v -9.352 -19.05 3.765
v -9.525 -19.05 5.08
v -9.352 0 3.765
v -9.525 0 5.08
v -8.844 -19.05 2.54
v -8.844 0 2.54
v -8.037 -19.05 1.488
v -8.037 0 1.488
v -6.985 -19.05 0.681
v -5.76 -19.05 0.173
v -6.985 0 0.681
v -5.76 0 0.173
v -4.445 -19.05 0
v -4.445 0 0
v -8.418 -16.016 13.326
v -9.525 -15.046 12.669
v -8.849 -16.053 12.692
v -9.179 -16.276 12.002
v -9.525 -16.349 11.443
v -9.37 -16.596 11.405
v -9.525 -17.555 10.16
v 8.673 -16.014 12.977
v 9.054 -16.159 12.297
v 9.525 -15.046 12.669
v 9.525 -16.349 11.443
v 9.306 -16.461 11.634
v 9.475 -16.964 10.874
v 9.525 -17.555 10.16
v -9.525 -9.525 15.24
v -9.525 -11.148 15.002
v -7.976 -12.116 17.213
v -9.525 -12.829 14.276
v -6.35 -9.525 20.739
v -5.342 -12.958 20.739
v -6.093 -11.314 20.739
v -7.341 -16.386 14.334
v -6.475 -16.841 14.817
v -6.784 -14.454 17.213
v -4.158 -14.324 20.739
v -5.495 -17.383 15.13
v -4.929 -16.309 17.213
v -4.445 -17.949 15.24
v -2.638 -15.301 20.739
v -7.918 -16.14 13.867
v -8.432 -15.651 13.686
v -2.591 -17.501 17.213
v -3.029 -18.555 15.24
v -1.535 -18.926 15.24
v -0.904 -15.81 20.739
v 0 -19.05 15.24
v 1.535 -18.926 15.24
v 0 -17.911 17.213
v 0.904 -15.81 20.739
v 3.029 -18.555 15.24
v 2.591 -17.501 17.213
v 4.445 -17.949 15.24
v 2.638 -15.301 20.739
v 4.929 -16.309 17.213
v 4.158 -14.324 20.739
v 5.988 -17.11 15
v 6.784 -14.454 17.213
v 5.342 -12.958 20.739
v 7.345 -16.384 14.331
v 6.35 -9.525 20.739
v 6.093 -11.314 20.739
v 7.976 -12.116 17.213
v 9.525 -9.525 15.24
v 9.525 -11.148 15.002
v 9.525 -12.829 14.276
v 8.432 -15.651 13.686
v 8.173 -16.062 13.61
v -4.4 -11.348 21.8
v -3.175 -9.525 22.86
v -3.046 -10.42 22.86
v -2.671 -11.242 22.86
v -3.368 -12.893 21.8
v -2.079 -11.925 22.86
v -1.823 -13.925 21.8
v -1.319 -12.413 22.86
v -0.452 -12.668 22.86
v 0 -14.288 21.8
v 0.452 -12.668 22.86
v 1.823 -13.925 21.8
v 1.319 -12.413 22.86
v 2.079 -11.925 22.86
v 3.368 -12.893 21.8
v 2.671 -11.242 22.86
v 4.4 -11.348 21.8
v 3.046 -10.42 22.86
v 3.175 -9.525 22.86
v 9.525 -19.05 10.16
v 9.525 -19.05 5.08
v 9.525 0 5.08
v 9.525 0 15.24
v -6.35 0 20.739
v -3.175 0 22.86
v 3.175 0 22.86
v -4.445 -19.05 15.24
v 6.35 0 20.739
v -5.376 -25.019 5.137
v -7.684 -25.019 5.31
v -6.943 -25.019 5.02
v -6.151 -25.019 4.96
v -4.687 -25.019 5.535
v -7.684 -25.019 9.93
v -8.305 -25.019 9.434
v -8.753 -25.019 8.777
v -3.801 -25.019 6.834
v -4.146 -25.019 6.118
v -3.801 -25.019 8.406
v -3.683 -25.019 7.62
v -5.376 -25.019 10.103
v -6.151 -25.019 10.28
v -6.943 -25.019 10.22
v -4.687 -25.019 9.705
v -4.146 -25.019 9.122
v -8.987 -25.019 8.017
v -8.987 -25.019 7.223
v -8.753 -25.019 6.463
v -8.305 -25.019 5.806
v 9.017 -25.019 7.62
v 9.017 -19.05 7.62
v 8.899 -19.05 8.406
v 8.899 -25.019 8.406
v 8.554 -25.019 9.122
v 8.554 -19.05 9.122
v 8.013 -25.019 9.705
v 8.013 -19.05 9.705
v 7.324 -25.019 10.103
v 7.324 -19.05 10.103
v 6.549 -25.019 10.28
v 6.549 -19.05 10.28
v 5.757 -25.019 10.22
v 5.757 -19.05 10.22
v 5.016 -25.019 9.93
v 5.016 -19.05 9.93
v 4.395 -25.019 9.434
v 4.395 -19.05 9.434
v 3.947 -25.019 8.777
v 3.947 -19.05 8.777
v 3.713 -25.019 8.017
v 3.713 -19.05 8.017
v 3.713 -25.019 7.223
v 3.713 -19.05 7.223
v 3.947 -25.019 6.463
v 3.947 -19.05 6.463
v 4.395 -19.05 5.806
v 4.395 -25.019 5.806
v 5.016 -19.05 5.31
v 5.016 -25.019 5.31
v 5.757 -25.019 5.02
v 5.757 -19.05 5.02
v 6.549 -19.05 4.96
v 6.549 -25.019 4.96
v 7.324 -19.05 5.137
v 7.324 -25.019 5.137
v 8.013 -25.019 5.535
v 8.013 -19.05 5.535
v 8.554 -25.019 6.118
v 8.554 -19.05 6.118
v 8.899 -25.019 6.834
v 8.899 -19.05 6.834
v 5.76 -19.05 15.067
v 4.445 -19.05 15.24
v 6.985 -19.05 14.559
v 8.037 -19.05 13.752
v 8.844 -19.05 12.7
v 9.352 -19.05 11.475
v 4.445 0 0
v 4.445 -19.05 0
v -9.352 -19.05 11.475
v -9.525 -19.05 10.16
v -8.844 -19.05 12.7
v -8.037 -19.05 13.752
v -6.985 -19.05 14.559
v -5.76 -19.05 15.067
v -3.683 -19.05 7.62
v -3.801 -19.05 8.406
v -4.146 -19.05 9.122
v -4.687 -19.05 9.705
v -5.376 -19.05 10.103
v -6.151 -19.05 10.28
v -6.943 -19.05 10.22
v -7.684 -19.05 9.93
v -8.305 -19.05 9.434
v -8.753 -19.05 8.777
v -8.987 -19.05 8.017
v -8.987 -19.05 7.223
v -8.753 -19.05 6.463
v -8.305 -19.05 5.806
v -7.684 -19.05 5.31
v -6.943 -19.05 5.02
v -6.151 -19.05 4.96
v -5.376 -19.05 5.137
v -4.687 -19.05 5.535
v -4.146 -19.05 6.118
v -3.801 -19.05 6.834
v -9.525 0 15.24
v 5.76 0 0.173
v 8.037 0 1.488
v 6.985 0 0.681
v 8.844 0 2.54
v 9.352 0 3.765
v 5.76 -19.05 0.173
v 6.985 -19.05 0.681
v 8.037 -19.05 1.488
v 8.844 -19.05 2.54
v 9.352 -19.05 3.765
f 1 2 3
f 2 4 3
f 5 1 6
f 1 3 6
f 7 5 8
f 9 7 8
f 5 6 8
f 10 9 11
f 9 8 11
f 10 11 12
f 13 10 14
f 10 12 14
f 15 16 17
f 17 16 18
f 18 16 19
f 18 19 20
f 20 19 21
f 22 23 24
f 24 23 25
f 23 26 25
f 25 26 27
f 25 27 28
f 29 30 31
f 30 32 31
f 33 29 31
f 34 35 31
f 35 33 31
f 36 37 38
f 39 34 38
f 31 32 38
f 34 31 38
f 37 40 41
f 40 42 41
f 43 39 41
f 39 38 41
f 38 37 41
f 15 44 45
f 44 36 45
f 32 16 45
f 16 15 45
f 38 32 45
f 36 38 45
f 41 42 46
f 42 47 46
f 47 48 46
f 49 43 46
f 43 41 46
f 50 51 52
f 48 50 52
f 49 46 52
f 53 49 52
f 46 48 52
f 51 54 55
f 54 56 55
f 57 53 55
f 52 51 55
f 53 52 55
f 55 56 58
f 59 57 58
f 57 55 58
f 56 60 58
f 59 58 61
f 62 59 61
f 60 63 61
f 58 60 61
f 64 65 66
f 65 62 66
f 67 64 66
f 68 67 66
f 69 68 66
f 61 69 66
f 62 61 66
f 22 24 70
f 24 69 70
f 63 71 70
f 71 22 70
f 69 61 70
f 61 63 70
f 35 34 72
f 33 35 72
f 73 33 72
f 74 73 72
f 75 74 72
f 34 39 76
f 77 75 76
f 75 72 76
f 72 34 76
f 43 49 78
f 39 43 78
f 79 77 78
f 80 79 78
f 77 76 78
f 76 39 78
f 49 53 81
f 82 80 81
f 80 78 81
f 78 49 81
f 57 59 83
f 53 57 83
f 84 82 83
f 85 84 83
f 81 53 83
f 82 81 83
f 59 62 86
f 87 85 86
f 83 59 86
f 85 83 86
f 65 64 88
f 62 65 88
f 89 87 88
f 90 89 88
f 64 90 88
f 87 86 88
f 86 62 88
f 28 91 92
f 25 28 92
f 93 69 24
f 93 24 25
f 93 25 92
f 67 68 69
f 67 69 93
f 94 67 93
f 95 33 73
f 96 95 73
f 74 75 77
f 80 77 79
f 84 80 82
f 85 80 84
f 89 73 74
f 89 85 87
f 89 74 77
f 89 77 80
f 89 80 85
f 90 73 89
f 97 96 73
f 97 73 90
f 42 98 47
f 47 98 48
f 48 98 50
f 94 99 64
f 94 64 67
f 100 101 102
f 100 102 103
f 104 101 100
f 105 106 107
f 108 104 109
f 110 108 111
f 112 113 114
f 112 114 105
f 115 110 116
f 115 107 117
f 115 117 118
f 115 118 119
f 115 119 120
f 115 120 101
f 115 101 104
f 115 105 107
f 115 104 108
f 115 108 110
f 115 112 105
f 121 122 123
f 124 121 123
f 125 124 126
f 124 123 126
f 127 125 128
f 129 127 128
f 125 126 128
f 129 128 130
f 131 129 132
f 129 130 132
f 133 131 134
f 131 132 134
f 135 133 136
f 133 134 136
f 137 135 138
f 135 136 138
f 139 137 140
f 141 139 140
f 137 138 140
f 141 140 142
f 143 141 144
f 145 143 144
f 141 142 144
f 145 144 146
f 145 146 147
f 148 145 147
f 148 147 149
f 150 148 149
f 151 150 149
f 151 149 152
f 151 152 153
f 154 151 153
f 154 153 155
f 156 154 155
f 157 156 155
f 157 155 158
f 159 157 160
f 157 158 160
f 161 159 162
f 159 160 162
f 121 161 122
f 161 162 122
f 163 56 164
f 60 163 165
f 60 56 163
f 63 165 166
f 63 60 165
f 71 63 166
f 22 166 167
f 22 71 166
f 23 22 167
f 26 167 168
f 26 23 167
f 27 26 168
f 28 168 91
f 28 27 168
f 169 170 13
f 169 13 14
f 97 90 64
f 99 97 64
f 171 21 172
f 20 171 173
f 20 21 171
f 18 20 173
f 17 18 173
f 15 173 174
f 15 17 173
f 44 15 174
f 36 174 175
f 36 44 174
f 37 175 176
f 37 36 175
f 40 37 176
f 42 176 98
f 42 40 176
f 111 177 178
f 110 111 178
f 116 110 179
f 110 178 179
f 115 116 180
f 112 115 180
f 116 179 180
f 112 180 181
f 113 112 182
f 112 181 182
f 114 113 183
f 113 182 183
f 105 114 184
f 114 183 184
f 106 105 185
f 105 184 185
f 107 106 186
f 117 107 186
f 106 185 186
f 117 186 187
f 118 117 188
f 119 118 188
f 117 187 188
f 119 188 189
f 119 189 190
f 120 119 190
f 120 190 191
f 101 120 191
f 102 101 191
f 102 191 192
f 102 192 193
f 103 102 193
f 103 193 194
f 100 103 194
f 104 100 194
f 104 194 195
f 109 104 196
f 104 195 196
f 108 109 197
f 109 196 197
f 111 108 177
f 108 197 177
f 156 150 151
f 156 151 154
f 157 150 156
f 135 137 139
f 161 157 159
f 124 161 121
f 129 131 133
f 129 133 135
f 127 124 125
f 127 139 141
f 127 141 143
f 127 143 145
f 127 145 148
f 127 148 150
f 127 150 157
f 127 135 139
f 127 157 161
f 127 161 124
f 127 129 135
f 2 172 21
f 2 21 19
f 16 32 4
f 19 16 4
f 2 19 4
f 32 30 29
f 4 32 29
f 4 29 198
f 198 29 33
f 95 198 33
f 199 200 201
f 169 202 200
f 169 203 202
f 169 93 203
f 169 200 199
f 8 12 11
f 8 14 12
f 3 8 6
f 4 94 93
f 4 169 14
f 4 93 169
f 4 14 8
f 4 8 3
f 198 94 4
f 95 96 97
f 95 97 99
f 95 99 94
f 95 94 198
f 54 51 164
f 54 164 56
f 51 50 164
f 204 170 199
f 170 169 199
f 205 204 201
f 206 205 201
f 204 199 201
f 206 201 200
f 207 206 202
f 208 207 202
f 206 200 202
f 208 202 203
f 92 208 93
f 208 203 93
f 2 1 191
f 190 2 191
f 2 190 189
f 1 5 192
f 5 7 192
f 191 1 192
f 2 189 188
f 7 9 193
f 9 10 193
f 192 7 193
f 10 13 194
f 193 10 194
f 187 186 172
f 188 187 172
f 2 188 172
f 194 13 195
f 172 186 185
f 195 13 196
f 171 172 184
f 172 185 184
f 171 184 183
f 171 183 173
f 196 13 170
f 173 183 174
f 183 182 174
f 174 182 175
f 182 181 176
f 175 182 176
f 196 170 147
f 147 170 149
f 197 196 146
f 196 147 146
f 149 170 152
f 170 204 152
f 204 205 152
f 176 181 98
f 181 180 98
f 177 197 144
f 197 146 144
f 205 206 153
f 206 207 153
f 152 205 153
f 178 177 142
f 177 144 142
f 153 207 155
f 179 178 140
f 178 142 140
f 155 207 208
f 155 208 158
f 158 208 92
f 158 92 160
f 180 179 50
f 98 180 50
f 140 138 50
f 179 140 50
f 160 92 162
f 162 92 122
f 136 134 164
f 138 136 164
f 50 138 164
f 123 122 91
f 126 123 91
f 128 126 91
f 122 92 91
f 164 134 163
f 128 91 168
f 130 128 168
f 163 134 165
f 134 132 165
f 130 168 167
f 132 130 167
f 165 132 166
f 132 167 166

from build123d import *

# Parameters (mm, degrees)
F0_W     = 19.05
F0_H     = 15.24
F1_DEPTH = 9.525
F2_R     = 2.667
F3_DEPTH = 5.969
F8_R     = 5.08


with BuildPart() as f1:
    # F0 (on Right) → F1 (new body, symmetric)
    with BuildSketch(Plane.YZ):
        with Locations((-9.525, 7.62)):
            Rectangle(F0_W, F0_H)
    extrude(amount=F1_DEPTH, both=True)

    # F2 (on face) → F3 (join)
    with BuildSketch(Plane.XZ.offset(19.05)):
        with Locations((6.35, 7.62)):
            Circle(F2_R)
        with Locations((-6.35, 7.62)):
            Circle(F2_R)
    extrude(amount=F3_DEPTH)

    # F4 (on Right) → F5 (revolve)
    with BuildSketch(Plane.YZ):
        Polygon((-19.05, 15.24), (-9.525, 15.24), (-9.525, 22.86), (-12.7, 22.86), (-15.875, 20.739261314), align=None)
    revolve(axis=Axis((0, -9.525, 19.05), (0, 0, 1)))

    # F6 (on face) → F7 (join, up to the next surface of F1)
    with BuildSketch(Plane(origin=(0, 0, 0), x_dir=(-1, 0, 0), z_dir=(0, 1, 0))):
        Polygon((-6.35, 20.739261314), (-9.525, 15.24), (0, 15.24), (9.525, 15.24), (6.35, 20.739261314), (3.175, 22.86), (-3.175, 22.86), align=None)
    extrude(until=Until.NEXT, dir=(0, -1, 0))

    # F8
    f8_edges = [f1.edges().sort_by_distance(p)[0] for p in [
        (9.525, -14.2875, 15.24),
        (-9.525, -14.2875, 15.24),
        (-9.525, -9.525, 0),
        (9.525, -9.525, 0),
    ]]
    fillet(f8_edges, radius=F8_R)


solid = f1.part
